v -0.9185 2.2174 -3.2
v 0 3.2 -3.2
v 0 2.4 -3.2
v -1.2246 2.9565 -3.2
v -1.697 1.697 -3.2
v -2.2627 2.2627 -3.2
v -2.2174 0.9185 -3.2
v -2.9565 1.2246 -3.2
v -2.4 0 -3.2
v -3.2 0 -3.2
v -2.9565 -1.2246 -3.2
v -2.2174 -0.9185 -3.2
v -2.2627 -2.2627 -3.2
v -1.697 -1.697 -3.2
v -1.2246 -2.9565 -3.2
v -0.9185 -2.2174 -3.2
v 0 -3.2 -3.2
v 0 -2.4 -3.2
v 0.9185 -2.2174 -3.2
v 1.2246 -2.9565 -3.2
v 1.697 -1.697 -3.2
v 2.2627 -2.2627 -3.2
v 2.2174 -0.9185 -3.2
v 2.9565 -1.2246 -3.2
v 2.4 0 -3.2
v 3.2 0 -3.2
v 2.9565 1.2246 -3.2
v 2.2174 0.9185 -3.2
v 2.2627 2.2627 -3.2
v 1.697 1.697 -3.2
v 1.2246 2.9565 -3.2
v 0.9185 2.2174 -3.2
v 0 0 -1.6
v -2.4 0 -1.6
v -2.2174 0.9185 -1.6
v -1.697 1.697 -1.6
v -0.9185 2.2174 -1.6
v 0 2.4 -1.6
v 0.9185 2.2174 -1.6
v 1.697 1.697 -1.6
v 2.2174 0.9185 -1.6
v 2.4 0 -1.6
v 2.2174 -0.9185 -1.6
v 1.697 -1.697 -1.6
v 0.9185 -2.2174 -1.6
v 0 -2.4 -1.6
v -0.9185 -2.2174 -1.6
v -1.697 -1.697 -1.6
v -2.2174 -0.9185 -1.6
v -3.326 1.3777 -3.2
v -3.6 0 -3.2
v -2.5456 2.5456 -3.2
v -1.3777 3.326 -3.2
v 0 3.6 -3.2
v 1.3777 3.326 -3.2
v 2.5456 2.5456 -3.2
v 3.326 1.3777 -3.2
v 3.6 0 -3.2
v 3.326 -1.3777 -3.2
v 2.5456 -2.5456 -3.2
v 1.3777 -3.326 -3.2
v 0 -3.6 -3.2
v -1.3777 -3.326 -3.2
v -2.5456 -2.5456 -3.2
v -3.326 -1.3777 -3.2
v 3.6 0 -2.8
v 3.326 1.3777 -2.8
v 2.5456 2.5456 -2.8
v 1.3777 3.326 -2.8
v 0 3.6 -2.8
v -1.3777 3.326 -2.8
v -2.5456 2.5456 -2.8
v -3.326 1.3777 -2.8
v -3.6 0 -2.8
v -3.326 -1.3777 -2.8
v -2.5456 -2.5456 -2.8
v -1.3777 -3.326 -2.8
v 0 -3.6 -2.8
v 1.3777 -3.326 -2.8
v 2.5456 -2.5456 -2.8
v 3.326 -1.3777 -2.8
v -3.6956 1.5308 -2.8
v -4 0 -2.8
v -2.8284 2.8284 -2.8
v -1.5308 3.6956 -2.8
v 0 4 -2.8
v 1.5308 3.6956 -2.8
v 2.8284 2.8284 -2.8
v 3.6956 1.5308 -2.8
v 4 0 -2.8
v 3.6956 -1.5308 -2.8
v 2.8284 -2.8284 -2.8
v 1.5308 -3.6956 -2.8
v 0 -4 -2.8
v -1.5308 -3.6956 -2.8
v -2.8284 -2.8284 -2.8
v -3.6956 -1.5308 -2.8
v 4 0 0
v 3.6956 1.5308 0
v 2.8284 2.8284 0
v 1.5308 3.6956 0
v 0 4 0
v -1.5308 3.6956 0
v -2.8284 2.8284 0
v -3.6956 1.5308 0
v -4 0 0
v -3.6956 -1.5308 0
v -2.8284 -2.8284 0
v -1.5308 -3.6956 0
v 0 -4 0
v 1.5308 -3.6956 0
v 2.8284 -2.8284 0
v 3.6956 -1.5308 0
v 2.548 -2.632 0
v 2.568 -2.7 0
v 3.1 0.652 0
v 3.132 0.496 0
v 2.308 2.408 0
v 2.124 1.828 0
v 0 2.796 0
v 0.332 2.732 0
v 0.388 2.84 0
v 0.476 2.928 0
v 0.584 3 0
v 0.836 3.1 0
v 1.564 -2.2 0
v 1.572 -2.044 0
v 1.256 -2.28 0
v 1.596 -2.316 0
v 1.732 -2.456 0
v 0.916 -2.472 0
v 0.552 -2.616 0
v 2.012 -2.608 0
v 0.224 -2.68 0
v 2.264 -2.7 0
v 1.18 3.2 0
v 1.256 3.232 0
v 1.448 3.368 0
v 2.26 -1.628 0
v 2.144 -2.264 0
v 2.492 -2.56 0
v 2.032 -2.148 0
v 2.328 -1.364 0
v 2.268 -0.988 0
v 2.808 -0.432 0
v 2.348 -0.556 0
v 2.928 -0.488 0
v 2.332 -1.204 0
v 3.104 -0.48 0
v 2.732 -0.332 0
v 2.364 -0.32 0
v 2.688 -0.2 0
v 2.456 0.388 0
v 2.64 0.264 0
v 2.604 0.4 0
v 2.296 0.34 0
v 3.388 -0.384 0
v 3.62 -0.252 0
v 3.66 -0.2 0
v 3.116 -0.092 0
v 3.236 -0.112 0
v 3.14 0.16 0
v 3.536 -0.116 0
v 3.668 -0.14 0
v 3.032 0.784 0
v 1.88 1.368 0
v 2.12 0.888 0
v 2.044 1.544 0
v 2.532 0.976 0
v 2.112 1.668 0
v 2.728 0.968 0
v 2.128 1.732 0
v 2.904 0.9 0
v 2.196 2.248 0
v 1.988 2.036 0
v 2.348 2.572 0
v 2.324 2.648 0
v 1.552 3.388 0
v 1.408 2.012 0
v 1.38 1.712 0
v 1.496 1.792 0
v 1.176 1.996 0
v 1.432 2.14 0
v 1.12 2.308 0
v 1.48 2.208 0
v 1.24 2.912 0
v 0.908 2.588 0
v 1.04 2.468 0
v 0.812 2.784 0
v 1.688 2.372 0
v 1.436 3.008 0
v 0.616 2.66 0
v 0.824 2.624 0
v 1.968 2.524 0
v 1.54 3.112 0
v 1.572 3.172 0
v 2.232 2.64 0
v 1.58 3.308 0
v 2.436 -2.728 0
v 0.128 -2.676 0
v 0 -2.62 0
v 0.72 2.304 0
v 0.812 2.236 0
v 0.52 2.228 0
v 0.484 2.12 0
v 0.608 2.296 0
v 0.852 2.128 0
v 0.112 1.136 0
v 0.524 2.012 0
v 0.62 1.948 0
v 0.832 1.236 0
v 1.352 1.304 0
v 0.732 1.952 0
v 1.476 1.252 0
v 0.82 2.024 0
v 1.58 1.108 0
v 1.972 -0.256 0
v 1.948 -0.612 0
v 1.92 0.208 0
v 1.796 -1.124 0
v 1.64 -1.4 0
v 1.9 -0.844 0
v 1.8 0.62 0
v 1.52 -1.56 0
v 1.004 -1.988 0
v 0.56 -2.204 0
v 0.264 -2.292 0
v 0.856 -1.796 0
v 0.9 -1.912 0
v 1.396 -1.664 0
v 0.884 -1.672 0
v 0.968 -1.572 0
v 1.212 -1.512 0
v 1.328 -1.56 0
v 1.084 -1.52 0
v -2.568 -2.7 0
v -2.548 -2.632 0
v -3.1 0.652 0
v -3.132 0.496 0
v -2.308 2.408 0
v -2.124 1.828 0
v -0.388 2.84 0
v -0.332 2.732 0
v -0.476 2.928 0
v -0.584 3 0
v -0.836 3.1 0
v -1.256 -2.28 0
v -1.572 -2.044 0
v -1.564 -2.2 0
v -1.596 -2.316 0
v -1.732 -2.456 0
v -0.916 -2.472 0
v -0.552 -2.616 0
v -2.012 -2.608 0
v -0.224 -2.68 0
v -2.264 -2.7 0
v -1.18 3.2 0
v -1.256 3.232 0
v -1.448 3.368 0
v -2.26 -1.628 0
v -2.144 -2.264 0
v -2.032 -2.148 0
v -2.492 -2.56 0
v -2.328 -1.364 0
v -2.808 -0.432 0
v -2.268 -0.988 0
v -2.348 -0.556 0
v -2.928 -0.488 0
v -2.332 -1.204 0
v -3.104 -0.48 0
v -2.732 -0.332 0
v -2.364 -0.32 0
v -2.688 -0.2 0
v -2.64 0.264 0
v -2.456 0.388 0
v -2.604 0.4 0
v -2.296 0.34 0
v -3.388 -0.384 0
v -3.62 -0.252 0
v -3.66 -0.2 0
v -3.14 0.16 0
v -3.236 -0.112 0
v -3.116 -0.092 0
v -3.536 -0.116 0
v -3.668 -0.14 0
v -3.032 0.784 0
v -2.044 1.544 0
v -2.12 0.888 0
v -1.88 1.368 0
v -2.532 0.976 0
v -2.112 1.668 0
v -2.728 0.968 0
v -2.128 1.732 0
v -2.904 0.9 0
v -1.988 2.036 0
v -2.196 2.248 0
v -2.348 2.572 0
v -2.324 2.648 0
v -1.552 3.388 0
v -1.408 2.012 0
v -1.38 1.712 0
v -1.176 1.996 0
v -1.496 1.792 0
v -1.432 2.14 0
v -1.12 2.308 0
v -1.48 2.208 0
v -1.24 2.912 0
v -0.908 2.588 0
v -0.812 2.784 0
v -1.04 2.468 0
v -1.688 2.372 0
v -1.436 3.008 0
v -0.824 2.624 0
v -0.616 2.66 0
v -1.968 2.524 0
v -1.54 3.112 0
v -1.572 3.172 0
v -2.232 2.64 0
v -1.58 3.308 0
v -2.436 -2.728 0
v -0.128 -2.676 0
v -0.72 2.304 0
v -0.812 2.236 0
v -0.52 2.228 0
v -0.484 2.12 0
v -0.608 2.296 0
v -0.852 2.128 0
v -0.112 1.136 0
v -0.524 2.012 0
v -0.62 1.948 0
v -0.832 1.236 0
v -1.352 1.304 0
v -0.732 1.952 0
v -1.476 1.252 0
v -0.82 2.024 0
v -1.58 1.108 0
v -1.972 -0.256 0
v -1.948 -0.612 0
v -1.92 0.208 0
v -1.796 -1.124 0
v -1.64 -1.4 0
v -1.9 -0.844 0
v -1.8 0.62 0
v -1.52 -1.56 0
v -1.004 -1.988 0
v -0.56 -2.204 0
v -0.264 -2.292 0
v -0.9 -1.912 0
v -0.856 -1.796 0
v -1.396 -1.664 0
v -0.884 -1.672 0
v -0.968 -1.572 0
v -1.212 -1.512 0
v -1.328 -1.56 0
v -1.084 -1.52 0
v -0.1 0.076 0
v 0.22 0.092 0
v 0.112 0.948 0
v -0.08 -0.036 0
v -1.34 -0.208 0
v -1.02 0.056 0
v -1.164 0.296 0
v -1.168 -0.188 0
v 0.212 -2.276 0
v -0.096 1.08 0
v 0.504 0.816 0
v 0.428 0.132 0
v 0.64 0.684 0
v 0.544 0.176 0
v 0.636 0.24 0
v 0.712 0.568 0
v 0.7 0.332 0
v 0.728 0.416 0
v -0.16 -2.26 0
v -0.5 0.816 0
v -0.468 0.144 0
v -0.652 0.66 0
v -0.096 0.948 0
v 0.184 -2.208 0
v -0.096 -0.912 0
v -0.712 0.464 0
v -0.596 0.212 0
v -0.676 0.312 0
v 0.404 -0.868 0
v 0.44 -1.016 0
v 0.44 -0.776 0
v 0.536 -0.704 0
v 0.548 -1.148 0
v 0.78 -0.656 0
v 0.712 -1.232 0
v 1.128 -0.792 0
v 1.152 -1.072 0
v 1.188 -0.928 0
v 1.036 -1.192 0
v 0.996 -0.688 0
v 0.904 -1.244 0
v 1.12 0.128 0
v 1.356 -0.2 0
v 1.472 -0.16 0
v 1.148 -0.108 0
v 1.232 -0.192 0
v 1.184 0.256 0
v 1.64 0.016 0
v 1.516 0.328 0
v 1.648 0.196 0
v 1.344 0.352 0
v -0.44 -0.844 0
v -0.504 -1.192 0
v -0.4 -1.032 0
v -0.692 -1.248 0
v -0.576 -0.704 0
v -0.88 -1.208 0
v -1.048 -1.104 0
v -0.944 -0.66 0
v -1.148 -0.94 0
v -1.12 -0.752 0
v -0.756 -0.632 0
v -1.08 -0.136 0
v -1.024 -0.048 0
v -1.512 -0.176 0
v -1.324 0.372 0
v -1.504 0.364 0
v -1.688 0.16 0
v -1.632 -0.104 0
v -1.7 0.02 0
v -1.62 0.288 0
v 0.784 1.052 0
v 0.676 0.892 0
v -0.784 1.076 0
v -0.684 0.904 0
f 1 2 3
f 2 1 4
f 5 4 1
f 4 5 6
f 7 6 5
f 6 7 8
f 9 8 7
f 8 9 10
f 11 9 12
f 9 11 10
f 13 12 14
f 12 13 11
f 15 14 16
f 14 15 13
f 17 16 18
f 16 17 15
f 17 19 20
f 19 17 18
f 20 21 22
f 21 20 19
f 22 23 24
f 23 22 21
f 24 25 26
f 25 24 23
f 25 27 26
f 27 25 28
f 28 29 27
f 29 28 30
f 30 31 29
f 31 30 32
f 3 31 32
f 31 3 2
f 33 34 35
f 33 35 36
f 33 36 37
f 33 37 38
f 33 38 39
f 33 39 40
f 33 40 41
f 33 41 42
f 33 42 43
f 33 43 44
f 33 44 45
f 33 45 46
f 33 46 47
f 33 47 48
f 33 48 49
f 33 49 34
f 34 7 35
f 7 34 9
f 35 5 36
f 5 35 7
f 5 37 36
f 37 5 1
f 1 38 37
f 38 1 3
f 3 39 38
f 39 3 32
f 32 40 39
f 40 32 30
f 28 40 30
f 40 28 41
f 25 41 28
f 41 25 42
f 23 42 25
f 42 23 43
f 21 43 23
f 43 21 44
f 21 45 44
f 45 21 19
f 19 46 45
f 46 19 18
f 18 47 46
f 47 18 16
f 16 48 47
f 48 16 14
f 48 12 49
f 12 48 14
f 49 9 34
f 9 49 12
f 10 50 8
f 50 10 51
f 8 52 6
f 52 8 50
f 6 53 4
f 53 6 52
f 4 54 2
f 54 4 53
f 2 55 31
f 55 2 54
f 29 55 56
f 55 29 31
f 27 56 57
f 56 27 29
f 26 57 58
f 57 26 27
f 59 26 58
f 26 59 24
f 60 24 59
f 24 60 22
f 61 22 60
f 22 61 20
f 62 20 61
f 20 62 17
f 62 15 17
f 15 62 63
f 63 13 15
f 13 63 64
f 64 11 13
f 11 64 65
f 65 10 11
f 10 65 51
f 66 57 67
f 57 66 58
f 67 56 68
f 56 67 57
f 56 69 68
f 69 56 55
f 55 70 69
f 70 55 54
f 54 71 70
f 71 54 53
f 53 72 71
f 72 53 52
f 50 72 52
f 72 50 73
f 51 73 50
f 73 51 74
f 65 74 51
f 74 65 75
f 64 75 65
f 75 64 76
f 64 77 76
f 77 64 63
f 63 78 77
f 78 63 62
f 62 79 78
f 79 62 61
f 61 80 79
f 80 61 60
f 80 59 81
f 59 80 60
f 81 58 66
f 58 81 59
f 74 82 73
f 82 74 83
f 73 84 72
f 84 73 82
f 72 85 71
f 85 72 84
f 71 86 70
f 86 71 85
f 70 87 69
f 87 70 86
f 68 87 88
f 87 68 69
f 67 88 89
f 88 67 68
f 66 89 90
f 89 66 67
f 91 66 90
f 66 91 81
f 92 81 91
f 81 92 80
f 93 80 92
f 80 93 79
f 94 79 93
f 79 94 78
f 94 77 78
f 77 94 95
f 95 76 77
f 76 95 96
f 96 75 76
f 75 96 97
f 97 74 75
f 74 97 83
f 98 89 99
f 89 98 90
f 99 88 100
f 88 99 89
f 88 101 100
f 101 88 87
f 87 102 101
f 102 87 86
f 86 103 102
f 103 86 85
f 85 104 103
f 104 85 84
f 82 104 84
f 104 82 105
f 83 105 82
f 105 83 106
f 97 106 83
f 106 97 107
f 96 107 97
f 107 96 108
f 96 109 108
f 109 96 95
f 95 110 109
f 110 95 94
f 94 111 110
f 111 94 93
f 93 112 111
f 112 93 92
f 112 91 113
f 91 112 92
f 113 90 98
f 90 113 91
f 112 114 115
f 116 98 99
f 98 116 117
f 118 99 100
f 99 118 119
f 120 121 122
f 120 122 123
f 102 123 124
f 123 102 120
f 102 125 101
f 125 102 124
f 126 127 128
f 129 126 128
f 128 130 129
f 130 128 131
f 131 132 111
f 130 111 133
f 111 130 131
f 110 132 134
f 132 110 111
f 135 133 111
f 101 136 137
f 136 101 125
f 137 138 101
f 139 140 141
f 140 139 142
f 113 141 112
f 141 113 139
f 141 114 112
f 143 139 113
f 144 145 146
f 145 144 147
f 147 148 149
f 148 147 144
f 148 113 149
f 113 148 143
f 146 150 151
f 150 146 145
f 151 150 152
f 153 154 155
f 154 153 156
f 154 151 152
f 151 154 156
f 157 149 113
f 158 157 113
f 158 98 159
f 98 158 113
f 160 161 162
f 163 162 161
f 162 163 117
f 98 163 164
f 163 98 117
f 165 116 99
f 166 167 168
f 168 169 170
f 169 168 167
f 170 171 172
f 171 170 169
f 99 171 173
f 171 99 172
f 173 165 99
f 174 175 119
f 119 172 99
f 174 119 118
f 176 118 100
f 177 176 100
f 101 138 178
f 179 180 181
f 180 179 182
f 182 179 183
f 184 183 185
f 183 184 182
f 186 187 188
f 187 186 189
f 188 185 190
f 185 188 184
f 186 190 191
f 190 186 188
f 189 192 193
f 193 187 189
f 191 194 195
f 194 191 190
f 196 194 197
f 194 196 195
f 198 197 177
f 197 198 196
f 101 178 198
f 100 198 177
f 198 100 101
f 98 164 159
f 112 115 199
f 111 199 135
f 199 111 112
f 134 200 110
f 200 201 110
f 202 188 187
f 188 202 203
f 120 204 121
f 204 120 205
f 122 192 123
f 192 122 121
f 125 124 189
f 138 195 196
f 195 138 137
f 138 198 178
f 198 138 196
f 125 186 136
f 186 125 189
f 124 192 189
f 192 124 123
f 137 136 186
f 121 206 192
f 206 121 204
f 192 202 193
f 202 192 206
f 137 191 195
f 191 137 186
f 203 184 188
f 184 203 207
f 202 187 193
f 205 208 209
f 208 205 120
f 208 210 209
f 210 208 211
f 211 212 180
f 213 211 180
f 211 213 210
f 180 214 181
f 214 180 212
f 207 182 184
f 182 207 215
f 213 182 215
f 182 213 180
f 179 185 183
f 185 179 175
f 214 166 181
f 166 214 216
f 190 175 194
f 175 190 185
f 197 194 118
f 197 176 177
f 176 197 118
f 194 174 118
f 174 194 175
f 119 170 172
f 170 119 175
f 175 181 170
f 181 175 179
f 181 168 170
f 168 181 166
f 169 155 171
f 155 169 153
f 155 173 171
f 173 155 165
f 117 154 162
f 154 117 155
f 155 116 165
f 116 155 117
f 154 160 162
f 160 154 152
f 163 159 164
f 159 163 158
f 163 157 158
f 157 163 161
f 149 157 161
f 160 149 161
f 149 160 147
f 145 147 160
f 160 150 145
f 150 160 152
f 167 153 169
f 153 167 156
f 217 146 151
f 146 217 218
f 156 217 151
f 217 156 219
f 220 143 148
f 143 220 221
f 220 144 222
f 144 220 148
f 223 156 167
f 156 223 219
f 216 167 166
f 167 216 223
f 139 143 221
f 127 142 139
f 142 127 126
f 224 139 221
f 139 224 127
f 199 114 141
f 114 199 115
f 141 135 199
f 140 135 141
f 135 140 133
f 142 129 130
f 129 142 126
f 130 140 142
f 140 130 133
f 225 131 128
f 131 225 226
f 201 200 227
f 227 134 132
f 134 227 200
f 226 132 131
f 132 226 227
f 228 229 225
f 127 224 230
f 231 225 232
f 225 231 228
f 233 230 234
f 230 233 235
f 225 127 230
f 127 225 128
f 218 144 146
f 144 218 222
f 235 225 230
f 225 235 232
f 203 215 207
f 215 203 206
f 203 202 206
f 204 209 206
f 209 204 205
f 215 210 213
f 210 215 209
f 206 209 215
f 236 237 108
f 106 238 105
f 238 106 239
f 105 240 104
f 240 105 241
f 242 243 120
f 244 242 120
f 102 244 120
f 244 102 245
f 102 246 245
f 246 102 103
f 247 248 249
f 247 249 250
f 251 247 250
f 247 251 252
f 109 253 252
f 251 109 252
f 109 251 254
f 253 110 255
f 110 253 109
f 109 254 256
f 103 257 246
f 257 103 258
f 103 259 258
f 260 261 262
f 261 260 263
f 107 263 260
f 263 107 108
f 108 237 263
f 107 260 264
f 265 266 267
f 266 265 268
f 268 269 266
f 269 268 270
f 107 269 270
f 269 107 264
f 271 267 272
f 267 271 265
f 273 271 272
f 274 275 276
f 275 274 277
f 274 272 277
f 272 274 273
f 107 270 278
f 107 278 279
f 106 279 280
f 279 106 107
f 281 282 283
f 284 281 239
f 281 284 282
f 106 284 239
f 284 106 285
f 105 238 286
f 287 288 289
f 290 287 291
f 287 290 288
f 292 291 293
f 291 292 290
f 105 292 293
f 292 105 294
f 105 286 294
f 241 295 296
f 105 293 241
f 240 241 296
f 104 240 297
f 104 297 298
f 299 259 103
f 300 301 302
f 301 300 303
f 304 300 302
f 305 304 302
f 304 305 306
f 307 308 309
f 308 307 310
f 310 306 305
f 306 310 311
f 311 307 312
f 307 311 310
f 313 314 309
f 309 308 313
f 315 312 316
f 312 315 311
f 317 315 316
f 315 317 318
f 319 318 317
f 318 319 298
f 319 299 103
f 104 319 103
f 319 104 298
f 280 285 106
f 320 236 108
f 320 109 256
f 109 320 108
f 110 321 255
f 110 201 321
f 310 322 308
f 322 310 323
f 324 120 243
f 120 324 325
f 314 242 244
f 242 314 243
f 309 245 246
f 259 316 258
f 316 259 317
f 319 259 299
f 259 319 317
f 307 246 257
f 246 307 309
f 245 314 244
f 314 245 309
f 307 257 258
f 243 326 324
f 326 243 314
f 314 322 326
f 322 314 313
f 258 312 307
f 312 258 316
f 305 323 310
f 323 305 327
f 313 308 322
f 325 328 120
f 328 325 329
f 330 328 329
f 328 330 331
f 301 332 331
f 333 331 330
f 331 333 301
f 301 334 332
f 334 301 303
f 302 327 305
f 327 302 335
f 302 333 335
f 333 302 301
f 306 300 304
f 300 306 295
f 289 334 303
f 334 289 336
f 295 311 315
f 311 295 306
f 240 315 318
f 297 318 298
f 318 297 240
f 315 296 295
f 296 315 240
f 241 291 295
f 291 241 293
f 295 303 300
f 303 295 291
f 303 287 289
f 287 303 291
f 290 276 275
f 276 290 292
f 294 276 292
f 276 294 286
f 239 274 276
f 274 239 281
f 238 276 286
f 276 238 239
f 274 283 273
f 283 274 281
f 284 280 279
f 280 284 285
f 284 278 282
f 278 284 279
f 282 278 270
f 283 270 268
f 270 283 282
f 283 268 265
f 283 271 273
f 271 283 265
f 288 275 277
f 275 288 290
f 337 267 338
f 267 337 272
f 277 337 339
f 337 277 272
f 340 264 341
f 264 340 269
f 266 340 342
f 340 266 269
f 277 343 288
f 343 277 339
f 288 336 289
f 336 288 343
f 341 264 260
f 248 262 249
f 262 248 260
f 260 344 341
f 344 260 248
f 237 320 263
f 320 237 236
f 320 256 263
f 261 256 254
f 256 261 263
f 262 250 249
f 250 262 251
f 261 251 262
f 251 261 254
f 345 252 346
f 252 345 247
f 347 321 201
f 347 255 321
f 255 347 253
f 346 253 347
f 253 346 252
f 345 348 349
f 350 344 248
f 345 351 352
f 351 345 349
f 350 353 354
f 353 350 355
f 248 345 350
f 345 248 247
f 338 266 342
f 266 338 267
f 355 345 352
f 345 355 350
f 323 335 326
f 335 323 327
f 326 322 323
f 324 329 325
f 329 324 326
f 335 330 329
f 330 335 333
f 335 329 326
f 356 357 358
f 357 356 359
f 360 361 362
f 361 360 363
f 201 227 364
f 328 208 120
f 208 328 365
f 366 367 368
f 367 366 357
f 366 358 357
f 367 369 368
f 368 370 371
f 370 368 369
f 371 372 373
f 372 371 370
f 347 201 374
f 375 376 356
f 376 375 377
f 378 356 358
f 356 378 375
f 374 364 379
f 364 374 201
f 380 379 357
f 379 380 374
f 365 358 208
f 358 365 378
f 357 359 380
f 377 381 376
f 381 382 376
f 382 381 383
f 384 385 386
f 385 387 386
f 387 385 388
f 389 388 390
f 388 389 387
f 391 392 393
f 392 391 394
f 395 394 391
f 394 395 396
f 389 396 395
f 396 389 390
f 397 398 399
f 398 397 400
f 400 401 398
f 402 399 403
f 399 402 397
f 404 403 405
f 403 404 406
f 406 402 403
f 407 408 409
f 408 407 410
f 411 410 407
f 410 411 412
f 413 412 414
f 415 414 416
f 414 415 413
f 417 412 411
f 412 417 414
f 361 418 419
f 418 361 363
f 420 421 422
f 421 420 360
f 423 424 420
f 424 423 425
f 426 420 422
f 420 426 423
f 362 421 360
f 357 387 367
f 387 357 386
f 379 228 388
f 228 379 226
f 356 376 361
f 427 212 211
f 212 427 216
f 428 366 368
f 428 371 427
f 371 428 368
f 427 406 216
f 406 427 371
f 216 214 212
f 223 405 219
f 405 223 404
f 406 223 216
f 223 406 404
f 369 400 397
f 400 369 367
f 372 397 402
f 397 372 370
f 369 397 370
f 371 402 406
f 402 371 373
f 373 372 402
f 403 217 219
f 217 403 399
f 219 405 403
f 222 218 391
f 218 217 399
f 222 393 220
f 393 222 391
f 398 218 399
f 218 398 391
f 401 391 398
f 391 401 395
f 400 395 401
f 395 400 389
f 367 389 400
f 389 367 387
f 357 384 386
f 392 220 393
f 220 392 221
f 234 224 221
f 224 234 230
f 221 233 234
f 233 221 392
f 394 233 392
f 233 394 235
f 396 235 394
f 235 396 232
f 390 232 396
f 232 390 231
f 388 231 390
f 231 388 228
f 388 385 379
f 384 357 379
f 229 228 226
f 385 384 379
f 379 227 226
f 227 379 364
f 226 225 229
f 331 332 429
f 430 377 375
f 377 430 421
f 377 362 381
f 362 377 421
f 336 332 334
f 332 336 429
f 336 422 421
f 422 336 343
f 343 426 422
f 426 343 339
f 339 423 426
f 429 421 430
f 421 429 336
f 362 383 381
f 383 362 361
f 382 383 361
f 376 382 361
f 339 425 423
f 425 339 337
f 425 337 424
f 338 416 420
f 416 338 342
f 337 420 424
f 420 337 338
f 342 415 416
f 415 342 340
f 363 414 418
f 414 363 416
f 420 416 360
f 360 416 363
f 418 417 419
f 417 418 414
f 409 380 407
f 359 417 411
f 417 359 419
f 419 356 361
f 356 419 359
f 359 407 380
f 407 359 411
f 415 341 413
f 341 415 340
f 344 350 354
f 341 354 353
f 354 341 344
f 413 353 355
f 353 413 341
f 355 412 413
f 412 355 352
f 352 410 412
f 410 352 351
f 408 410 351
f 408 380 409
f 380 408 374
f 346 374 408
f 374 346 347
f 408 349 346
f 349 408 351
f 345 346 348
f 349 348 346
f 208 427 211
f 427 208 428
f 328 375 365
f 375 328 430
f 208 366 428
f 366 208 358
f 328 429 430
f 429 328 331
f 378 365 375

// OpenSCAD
use <../lib.scad>
use <../p/4-4ering.scad>
use <s/98138p3ds01.scad>
use <s/98138s02.scad>
function ldraw_lib__98138p3d() = [
// 0 Tile  1 x  1 Round with Red Ladybug Pattern
// 0 Name: 98138p3d.dat
// 0 Author: Philippe Hurbain [Philo]
// 0 !LDRAW_ORG Part UPDATE 2026-04
// 0 !LICENSE Licensed under CC BY 4.0 : see CAreadme.txt
// 
// 0 BFC CERTIFY CCW
  [0,"BFC","CERTIFY"],
  [0,"BFC","CCW"],
// 
// 0 !KEYWORDS Bricklink 98138pb447, Brickowl 405170, Brickset 107749, Insect
// 0 !KEYWORDS Rebrickable 98138pr0429, Set 42651, Set 42652, Set 42669, Set 42670
// 
// 0 !HISTORY 2025-02-27 [OrionP] Official Update 2025-02
// 0 !HISTORY 2026-01-16 [Blechtaler] added NOCLIP
// 0 !HISTORY 2026-04-27 [OrionP] Official Update 2026-04
// 
// 1 16 0 0 0 1 0 0 0 1 0 0 0 1 s\98138s02.dat
  [1,16,0,0,0,1,0,0,0,1,0,0,0,1, ldraw_lib__s__98138s02()],
// 1 16 0 0 0 10 0 0 0 1 0 0 0 10 4-4ering.dat
  [1,16,0,0,0,10,0,0,0,1,0,0,0,10, ldraw_lib__4_4ering()],
// 
// 1 16 0 0 0 1 0 0 0 1 0 0 0 1 s\98138p3ds01.dat
  [1,16,0,0,0,1,0,0,0,1,0,0,0,1, ldraw_lib__s__98138p3ds01()],
// 1 16 0 0 0 -1 0 0 0 1 0 0 0 1 s\98138p3ds01.dat
  [1,16,0,0,0,-1,0,0,0,1,0,0,0,1, ldraw_lib__s__98138p3ds01()],
// 
// 0 BFC NOCLIP
  [0,"BFC","NOCLIP"],
// 4 0 -.2 0 -.09 .55 0 .23 .28 0 2.37 -.25 0 .19
  [4,0,-.2,0,-.09,.55,0,.23,.28,0,2.37,-.25,0,.19],
// 4 0 -2.92 0 -.47 -2.55 0 .14 -2.91 0 .74 -3.35 0 -.52
  [4,0,-2.92,0,-.47,-2.55,0,.14,-2.91,0,.74,-3.35,0,-.52],
// 3 0 0 0 -6.55 .66 0 -5.73 .53 0 -5.69
  [3,0,0,0,-6.55,.66,0,-5.73,.53,0,-5.69],
// 4 0 -.24 0 2.7 .28 0 2.84 0 0 6.99 -.28 0 2.84
  [4,0,-.24,0,2.7,.28,0,2.84,0,0,6.99,-.28,0,2.84],
// 4 0 .55 0 .23 1.07 0 .33 1.6 0 1.71 1.26 0 2.04
  [4,0,.55,0,.23,1.07,0,.33,1.6,0,1.71,1.26,0,2.04],
// 3 0 1.26 0 2.04 .28 0 2.37 .55 0 .23
  [3,0,1.26,0,2.04,.28,0,2.37,.55,0,.23],
// 3 0 1.07 0 .33 1.36 0 .44 1.6 0 1.71
  [3,0,1.07,0,.33,1.36,0,.44,1.6,0,1.71],
// 4 0 1.78 0 1.42 1.6 0 1.71 1.36 0 .44 1.59 0 .6
  [4,0,1.78,0,1.42,1.6,0,1.71,1.36,0,.44,1.59,0,.6],
// 4 0 1.82 0 1.04 1.78 0 1.42 1.59 0 .6 1.75 0 .83
  [4,0,1.82,0,1.04,1.78,0,1.42,1.59,0,.6,1.75,0,.83],
// 3 0 -.66 0 -5.73 0 0 -6.55 -.4 0 -5.65
  [3,0,-.66,0,-5.73,0,0,-6.55,-.4,0,-5.65],
// 4 0 -.25 0 .19 -1.25 0 2.04 -1.63 0 1.65 -1.17 0 .36
  [4,0,-.25,0,.19,-1.25,0,2.04,-1.63,0,1.65,-1.17,0,.36],
// 4 0 -1.25 0 2.04 -.25 0 .19 .28 0 2.37 -.24 0 2.37
  [4,0,-1.25,0,2.04,-.25,0,.19,.28,0,2.37,-.24,0,2.37],
// 4 0 .46 0 -5.52 -.4 0 -5.65 0 0 -6.55 .53 0 -5.69
  [4,0,.46,0,-5.52,-.4,0,-5.65,0,0,-6.55,.53,0,-5.69],
// 4 0 .55 0 .23 -.24 0 -2.28 -.4 0 -5.65 .46 0 -5.52
  [4,0,.55,0,.23,-.24,0,-2.28,-.4,0,-5.65,.46,0,-5.52],
// 4 0 .28 0 2.37 .28 0 2.84 -.24 0 2.7 -.24 0 2.37
  [4,0,.28,0,2.37,.28,0,2.84,-.24,0,2.7,-.24,0,2.37],
// 3 0 .55 0 .23 -.2 0 -.09 -.24 0 -2.28
  [3,0,.55,0,.23,-.2,0,-.09,-.24,0,-2.28],
// 3 0 -1.63 0 1.65 -1.78 0 1.16 -1.17 0 .36
  [3,0,-1.63,0,1.65,-1.78,0,1.16,-1.17,0,.36],
// 4 0 -1.17 0 .36 -1.78 0 1.16 -1.69 0 .78 -1.49 0 .53
  [4,0,-1.17,0,.36,-1.78,0,1.16,-1.69,0,.78,-1.49,0,.53],
// 3 0 1.01 0 -2.17 1.1 0 -2.54 1.1 0 -1.94
  [3,0,1.01,0,-2.17,1.1,0,-2.54,1.1,0,-1.94],
// 4 0 1.37 0 -2.87 1.34 0 -1.76 1.1 0 -1.94 1.1 0 -2.54
  [4,0,1.37,0,-2.87,1.34,0,-1.76,1.1,0,-1.94,1.1,0,-2.54],
// 4 0 1.34 0 -1.76 1.37 0 -2.87 1.78 0 -3.08 1.95 0 -1.64
  [4,0,1.34,0,-1.76,1.37,0,-2.87,1.78,0,-3.08,1.95,0,-1.64],
// 4 0 2.97 0 -2.32 2.82 0 -1.98 2.59 0 -2.98 2.88 0 -2.68
  [4,0,2.97,0,-2.32,2.82,0,-1.98,2.59,0,-2.98,2.88,0,-2.68],
// 4 0 2.26 0 -3.11 2.59 0 -2.98 2.82 0 -1.98 2.49 0 -1.72
  [4,0,2.26,0,-3.11,2.59,0,-2.98,2.82,0,-1.98,2.49,0,-1.72],
// 4 0 1.78 0 -3.08 2.26 0 -3.11 2.49 0 -1.72 1.95 0 -1.64
  [4,0,1.78,0,-3.08,2.26,0,-3.11,2.49,0,-1.72,1.95,0,-1.64],
// 4 0 3.68 0 -.4 2.8 0 .32 2.87 0 -.27 3.39 0 -.5
  [4,0,3.68,0,-.4,2.8,0,.32,2.87,0,-.27,3.39,0,-.5],
// 3 0 2.87 0 -.27 3.08 0 -.48 3.39 0 -.5
  [3,0,2.87,0,-.27,3.08,0,-.48,3.39,0,-.5],
// 4 0 2.8 0 .32 3.68 0 -.4 4.1 0 .04 2.96 0 .64
  [4,0,2.8,0,.32,3.68,0,-.4,4.1,0,.04,2.96,0,.64],
// 4 0 4.12 0 .49 3.79 0 .82 3.36 0 .88 4.1 0 .04
  [4,0,4.12,0,.49,3.79,0,.82,3.36,0,.88,4.1,0,.04],
// 3 0 3.36 0 .88 2.96 0 .64 4.1 0 .04
  [3,0,3.36,0,.88,2.96,0,.64,4.1,0,.04],
// 4 0 -1 0 -2.58 -1.1 0 -2.11 -1.73 0 -3.12 -1.26 0 -2.98
  [4,0,-1,0,-2.58,-1.1,0,-2.11,-1.73,0,-3.12,-1.26,0,-2.98],
// 4 0 -1.1 0 -2.11 -1.44 0 -1.76 -2.2 0 -3.02 -1.73 0 -3.12
  [4,0,-1.1,0,-2.11,-1.44,0,-1.76,-2.2,0,-3.02,-1.73,0,-3.12],
// 3 0 -2.62 0 -2.76 -2.2 0 -3.02 -2.36 0 -1.65
  [3,0,-2.62,0,-2.76,-2.2,0,-3.02,-2.36,0,-1.65],
// 4 0 -2.62 0 -2.76 -2.36 0 -1.65 -2.8 0 -1.88 -2.87 0 -2.35
  [4,0,-2.62,0,-2.76,-2.36,0,-1.65,-2.8,0,-1.88,-2.87,0,-2.35],
// 4 0 -2.36 0 -1.65 -2.2 0 -3.02 -1.44 0 -1.76 -1.89 0 -1.58
  [4,0,-2.36,0,-1.65,-2.2,0,-3.02,-1.44,0,-1.76,-1.89,0,-1.58],
// 4 0 -2.56 0 -.12 -2.55 0 .14 -2.92 0 -.47 -2.7 0 -.34
  [4,0,-2.56,0,-.12,-2.55,0,.14,-2.92,0,-.47,-2.7,0,-.34],
// 4 0 -3.76 0 .91 -3.78 0 -.44 -3.35 0 -.52 -3.31 0 .93
  [4,0,-3.76,0,.91,-3.78,0,-.44,-3.35,0,-.52,-3.31,0,.93],
// 4 0 -4.25 0 .05 -4.08 0 -.26 -3.78 0 -.44 -4.22 0 .4
  [4,0,-4.25,0,.05,-4.08,0,-.26,-3.78,0,-.44,-4.22,0,.4],
// 4 0 -4.05 0 .72 -4.22 0 .4 -3.78 0 -.44 -3.76 0 .91
  [4,0,-4.05,0,.72,-4.22,0,.4,-3.78,0,-.44,-3.76,0,.91],
// 3 0 -2.91 0 .74 -3.31 0 .93 -3.35 0 -.52
  [3,0,-2.91,0,.74,-3.31,0,.93,-3.35,0,-.52],
// 4 4 1.1 0 -1.94 1.34 0 -1.76 1.07 0 .33 .55 0 .23
  [4,4,1.1,0,-1.94,1.34,0,-1.76,1.07,0,.33,.55,0,.23],
// 4 4 1.37 0 -2.87 .46 0 -5.52 1.4 0 -5.51 2.14 0 -4.49
  [4,4,1.37,0,-2.87,.46,0,-5.52,1.4,0,-5.51,2.14,0,-4.49],
// 3 4 -.25 0 .19 -1.17 0 .36 -2.55 0 .14
  [3,4,-.25,0,.19,-1.17,0,.36,-2.55,0,.14],
// 4 4 3.95 0 2.77 3.38 0 3.26 2.08 0 3.09 1.96 0 2.63
  [4,4,3.95,0,2.77,3.38,0,3.26,2.08,0,3.09,1.96,0,2.63],
// 3 4 1.69 0 2.23 1.26 0 2.04 1.6 0 1.71
  [3,4,1.69,0,2.23,1.26,0,2.04,1.6,0,1.71],
// 4 4 1.6 0 1.71 1.78 0 1.42 1.96 0 2.63 1.69 0 2.23
  [4,4,1.6,0,1.71,1.78,0,1.42,1.96,0,2.63,1.69,0,2.23],
// 4 4 1.78 0 1.42 3.36 0 .88 3.95 0 2.77 1.96 0 2.63
  [4,4,1.78,0,1.42,3.36,0,.88,3.95,0,2.77,1.96,0,2.63],
// 3 4 3.95 0 2.77 3.69 0 3.13 3.38 0 3.26
  [3,4,3.95,0,2.77,3.69,0,3.13,3.38,0,3.26],
// 4 4 3.79 0 .82 4.12 0 .49 4.8 0 .52 4.5 0 1.55
  [4,4,3.79,0,.82,4.12,0,.49,4.8,0,.52,4.5,0,1.55],
// 4 4 3.95 0 2.77 3.36 0 .88 3.79 0 .82 4.5 0 1.55
  [4,4,3.95,0,2.77,3.36,0,.88,3.79,0,.82,4.5,0,1.55],
// 4 4 2.87 0 -.27 2.8 0 .32 1.36 0 .44 1.07 0 .33
  [4,4,2.87,0,-.27,2.8,0,.32,1.36,0,.44,1.07,0,.33],
// 4 4 1.59 0 .6 2.8 0 .32 2.96 0 .64 1.75 0 .83
  [4,4,1.59,0,.6,2.8,0,.32,2.96,0,.64,1.75,0,.83],
// 3 4 1.36 0 .44 2.8 0 .32 1.59 0 .6
  [3,4,1.36,0,.44,2.8,0,.32,1.59,0,.6],
// 4 4 1.82 0 1.04 2.96 0 .64 3.36 0 .88 1.78 0 1.42
  [4,4,1.82,0,1.04,2.96,0,.64,3.36,0,.88,1.78,0,1.42],
// 3 4 1.82 0 1.04 1.75 0 .83 2.96 0 .64
  [3,4,1.82,0,1.04,1.75,0,.83,2.96,0,.64],
// 4 4 3.68 0 -.4 4.93 0 -.64 4.8 0 .52 4.1 0 .04
  [4,4,3.68,0,-.4,4.93,0,-.64,4.8,0,.52,4.1,0,.04],
// 3 4 4.8 0 .52 4.12 0 .49 4.1 0 .04
  [3,4,4.8,0,.52,4.12,0,.49,4.1,0,.04],
// 3 4 4.75 0 -2.11 4.87 0 -1.53 2.82 0 -1.98
  [3,4,4.75,0,-2.11,4.87,0,-1.53,2.82,0,-1.98],
// 3 4 4.87 0 -1.53 4.93 0 -.64 3.68 0 -.4
  [3,4,4.87,0,-1.53,4.93,0,-.64,3.68,0,-.4],
// 4 4 4.49 0 -2.81 4.75 0 -2.11 2.82 0 -1.98 2.97 0 -2.32
  [4,4,4.49,0,-2.81,4.75,0,-2.11,2.82,0,-1.98,2.97,0,-2.32],
// 4 4 2.82 0 -1.98 4.87 0 -1.53 3.68 0 -.4 3.39 0 -.5
  [4,4,2.82,0,-1.98,4.87,0,-1.53,3.68,0,-.4,3.39,0,-.5],
// 4 4 2.49 0 -1.72 2.82 0 -1.98 3.39 0 -.5 3.08 0 -.48
  [4,4,2.49,0,-1.72,2.82,0,-1.98,3.39,0,-.5,3.08,0,-.48],
// 4 4 3.08 0 -.48 2.87 0 -.27 1.95 0 -1.64 2.49 0 -1.72
  [4,4,3.08,0,-.48,2.87,0,-.27,1.95,0,-1.64,2.49,0,-1.72],
// 4 4 2.87 0 -.27 1.07 0 .33 1.34 0 -1.76 1.95 0 -1.64
  [4,4,2.87,0,-.27,1.07,0,.33,1.34,0,-1.76,1.95,0,-1.64],
// 3 4 .55 0 .23 1.01 0 -2.17 1.1 0 -1.94
  [3,4,.55,0,.23,1.01,0,-2.17,1.1,0,-1.94],
// 4 4 2.97 0 -2.32 2.88 0 -2.68 4.1 0 -3.5 4.49 0 -2.81
  [4,4,2.97,0,-2.32,2.88,0,-2.68,4.1,0,-3.5,4.49,0,-2.81],
// 4 4 4.1 0 -3.5 3.32 0 -3.9 3.49 0 -4.16 3.8 0 -3.9
  [4,4,4.1,0,-3.5,3.32,0,-3.9,3.49,0,-4.16,3.8,0,-3.9],
// 4 4 3.32 0 -3.9 4.1 0 -3.5 2.88 0 -2.68 3.03 0 -3.78
  [4,4,3.32,0,-3.9,4.1,0,-3.5,2.88,0,-2.68,3.03,0,-3.78],
// 4 4 2.71 0 -3.8 3.03 0 -3.78 2.88 0 -2.68 2.59 0 -2.98
  [4,4,2.71,0,-3.8,3.03,0,-3.78,2.88,0,-2.68,2.59,0,-2.98],
// 4 4 2.59 0 -2.98 2.26 0 -3.11 2.42 0 -3.93 2.71 0 -3.8
  [4,4,2.59,0,-2.98,2.26,0,-3.11,2.42,0,-3.93,2.71,0,-3.8],
// 4 4 2.26 0 -3.11 1.78 0 -3.08 2.21 0 -4.18 2.42 0 -3.93
  [4,4,2.26,0,-3.11,1.78,0,-3.08,2.21,0,-4.18,2.42,0,-3.93],
// 4 4 2.14 0 -4.49 2.21 0 -4.18 1.78 0 -3.08 1.37 0 -2.87
  [4,4,2.14,0,-4.49,2.21,0,-4.18,1.78,0,-3.08,1.37,0,-2.87],
// 3 4 1.37 0 -2.87 1.1 0 -2.54 .46 0 -5.52
  [3,4,1.37,0,-2.87,1.1,0,-2.54,.46,0,-5.52],
// 3 4 1.01 0 -2.17 .55 0 .23 .46 0 -5.52
  [3,4,1.01,0,-2.17,.55,0,.23,.46,0,-5.52],
// 3 4 2.25 0 -4.78 2.14 0 -4.49 1.4 0 -5.51
  [3,4,2.25,0,-4.78,2.14,0,-4.49,1.4,0,-5.51],
// 3 4 1.1 0 -2.54 1.01 0 -2.17 .46 0 -5.52
  [3,4,1.1,0,-2.54,1.01,0,-2.17,.46,0,-5.52],
// 4 4 1.4 0 -5.51 .46 0 -5.52 .53 0 -5.69 .66 0 -5.73
  [4,4,1.4,0,-5.51,.46,0,-5.52,.53,0,-5.69,.66,0,-5.73],
// 3 4 1.4 0 -5.51 2.51 0 -4.97 2.25 0 -4.78
  [3,4,1.4,0,-5.51,2.51,0,-4.97,2.25,0,-4.78],
// 3 4 -2.08 0 3.09 -3.38 0 3.26 -1.96 0 2.69
  [3,4,-2.08,0,3.09,-3.38,0,3.26,-1.96,0,2.69],
// 4 4 -1.25 0 2.04 -1.71 0 2.26 -3.31 0 .93 -1.63 0 1.65
  [4,4,-1.25,0,2.04,-1.71,0,2.26,-3.31,0,.93,-1.63,0,1.65],
// 4 4 -3.31 0 .93 -2.91 0 .74 -1.78 0 1.16 -1.63 0 1.65
  [4,4,-3.31,0,.93,-2.91,0,.74,-1.78,0,1.16,-1.63,0,1.65],
// 4 4 -3.69 0 3.13 -3.95 0 2.77 -1.96 0 2.69 -3.38 0 3.26
  [4,4,-3.69,0,3.13,-3.95,0,2.77,-1.96,0,2.69,-3.38,0,3.26],
// 4 4 -3.31 0 .93 -3.95 0 2.77 -4.5 0 1.55 -3.76 0 .91
  [4,4,-3.31,0,.93,-3.95,0,2.77,-4.5,0,1.55,-3.76,0,.91],
// 4 4 -3.76 0 .91 -4.5 0 1.55 -4.8 0 .52 -4.05 0 .72
  [4,4,-3.76,0,.91,-4.5,0,1.55,-4.8,0,.52,-4.05,0,.72],
// 3 4 -4.8 0 .52 -4.22 0 .4 -4.05 0 .72
  [3,4,-4.8,0,.52,-4.22,0,.4,-4.05,0,.72],
// 4 4 -1.71 0 2.26 -1.96 0 2.69 -3.95 0 2.77 -3.31 0 .93
  [4,4,-1.71,0,2.26,-1.96,0,2.69,-3.95,0,2.77,-3.31,0,.93],
// 4 4 -2.55 0 .14 -1.69 0 .78 -1.78 0 1.16 -2.91 0 .74
  [4,4,-2.55,0,.14,-1.69,0,.78,-1.78,0,1.16,-2.91,0,.74],
// 3 4 -1.49 0 .53 -1.69 0 .78 -2.55 0 .14
  [3,4,-1.49,0,.53,-1.69,0,.78,-2.55,0,.14],
// 3 4 -1.17 0 .36 -1.49 0 .53 -2.55 0 .14
  [3,4,-1.17,0,.36,-1.49,0,.53,-2.55,0,.14],
// 4 4 -4.22 0 .4 -4.8 0 .52 -4.93 0 -.64 -4.25 0 .05
  [4,4,-4.22,0,.4,-4.8,0,.52,-4.93,0,-.64,-4.25,0,.05],
// 3 4 -4.25 0 .05 -4.93 0 -.64 -4.08 0 -.26
  [3,4,-4.25,0,.05,-4.93,0,-.64,-4.08,0,-.26],
// 4 4 -3.78 0 -.44 -4.87 0 -1.53 -4.75 0 -2.11 -2.8 0 -1.88
  [4,4,-3.78,0,-.44,-4.87,0,-1.53,-4.75,0,-2.11,-2.8,0,-1.88],
// 4 4 -4.08 0 -.26 -4.93 0 -.64 -4.87 0 -1.53 -3.78 0 -.44
  [4,4,-4.08,0,-.26,-4.93,0,-.64,-4.87,0,-1.53,-3.78,0,-.44],
// 4 4 -2.8 0 -1.88 -4.75 0 -2.11 -4.49 0 -2.81 -2.87 0 -2.35
  [4,4,-2.8,0,-1.88,-4.75,0,-2.11,-4.49,0,-2.81,-2.87,0,-2.35],
// 4 4 -2.7 0 -.34 -2.92 0 -.47 -2.8 0 -1.88 -2.36 0 -1.65
  [4,4,-2.7,0,-.34,-2.92,0,-.47,-2.8,0,-1.88,-2.36,0,-1.65],
// 3 4 -3.78 0 -.44 -2.8 0 -1.88 -3.35 0 -.52
  [3,4,-3.78,0,-.44,-2.8,0,-1.88,-3.35,0,-.52],
// 3 4 -3.35 0 -.52 -2.8 0 -1.88 -2.92 0 -.47
  [3,4,-3.35,0,-.52,-2.8,0,-1.88,-2.92,0,-.47],
// 4 4 -2.56 0 -.12 -2.7 0 -.34 -2.36 0 -1.65 -1.89 0 -1.58
  [4,4,-2.56,0,-.12,-2.7,0,-.34,-2.36,0,-1.65,-1.89,0,-1.58],
// 3 4 -1 0 -2.58 -.24 0 -2.28 -1.1 0 -2.11
  [3,4,-1,0,-2.58,-.24,0,-2.28,-1.1,0,-2.11],
// 4 4 -1.44 0 -1.76 -.2 0 -.09 -2.56 0 -.12 -1.89 0 -1.58
  [4,4,-1.44,0,-1.76,-.2,0,-.09,-2.56,0,-.12,-1.89,0,-1.58],
// 4 4 -.2 0 -.09 -.25 0 .19 -2.55 0 .14 -2.56 0 -.12
  [4,4,-.2,0,-.09,-.25,0,.19,-2.55,0,.14,-2.56,0,-.12],
// 4 4 -1.44 0 -1.76 -1.1 0 -2.11 -.24 0 -2.28 -.2 0 -.09
  [4,4,-1.44,0,-1.76,-1.1,0,-2.11,-.24,0,-2.28,-.2,0,-.09],
// 4 4 -2.62 0 -2.76 -2.87 0 -2.35 -4.49 0 -2.81 -4.1 0 -3.5
  [4,4,-2.62,0,-2.76,-2.87,0,-2.35,-4.49,0,-2.81,-4.1,0,-3.5],
// 3 4 -3.8 0 -3.9 -3.49 0 -4.16 -3.32 0 -3.9
  [3,4,-3.8,0,-3.9,-3.49,0,-4.16,-3.32,0,-3.9],
// 4 4 -3.03 0 -3.78 -4.1 0 -3.5 -3.8 0 -3.9 -3.32 0 -3.9
  [4,4,-3.03,0,-3.78,-4.1,0,-3.5,-3.8,0,-3.9,-3.32,0,-3.9],
// 4 4 -2.71 0 -3.8 -2.62 0 -2.76 -4.1 0 -3.5 -3.03 0 -3.78
  [4,4,-2.71,0,-3.8,-2.62,0,-2.76,-4.1,0,-3.5,-3.03,0,-3.78],
// 4 4 -2.42 0 -3.93 -2.2 0 -3.02 -2.62 0 -2.76 -2.71 0 -3.8
  [4,4,-2.42,0,-3.93,-2.2,0,-3.02,-2.62,0,-2.76,-2.71,0,-3.8],
// 4 4 -2.2 0 -3.02 -2.42 0 -3.93 -2.21 0 -4.18 -1.73 0 -3.12
  [4,4,-2.2,0,-3.02,-2.42,0,-3.93,-2.21,0,-4.18,-1.73,0,-3.12],
// 3 4 -1.26 0 -2.98 -1.73 0 -3.12 -2.21 0 -4.18
  [3,4,-1.26,0,-2.98,-1.73,0,-3.12,-2.21,0,-4.18],
// 4 4 -1 0 -2.58 -1.26 0 -2.98 -.4 0 -5.65 -.24 0 -2.28
  [4,4,-1,0,-2.58,-1.26,0,-2.98,-.4,0,-5.65,-.24,0,-2.28],
// 4 4 -1.26 0 -2.98 -1.4 0 -5.51 -.66 0 -5.73 -.4 0 -5.65
  [4,4,-1.26,0,-2.98,-1.4,0,-5.51,-.66,0,-5.73,-.4,0,-5.65],
// 4 4 -1.4 0 -5.51 -1.26 0 -2.98 -2.21 0 -4.18 -2.14 0 -4.49
  [4,4,-1.4,0,-5.51,-1.26,0,-2.98,-2.21,0,-4.18,-2.14,0,-4.49],
// 3 4 -2.51 0 -4.97 -1.4 0 -5.51 -2.25 0 -4.78
  [3,4,-2.51,0,-4.97,-1.4,0,-5.51,-2.25,0,-4.78],
// 3 4 -2.14 0 -4.49 -2.25 0 -4.78 -1.4 0 -5.51
  [3,4,-2.14,0,-4.49,-2.25,0,-4.78,-1.4,0,-5.51],
// 4 15 2.08 0 3.09 .28 0 2.84 1.69 0 2.23 1.96 0 2.63
  [4,15,2.08,0,3.09,.28,0,2.84,1.69,0,2.23,1.96,0,2.63],
// 4 15 -.24 0 2.7 -.28 0 2.84 -1.71 0 2.26 -1.25 0 2.04
  [4,15,-.24,0,2.7,-.28,0,2.84,-1.71,0,2.26,-1.25,0,2.04],
// 4 15 .28 0 2.37 1.26 0 2.04 1.69 0 2.23 .28 0 2.84
  [4,15,.28,0,2.37,1.26,0,2.04,1.69,0,2.23,.28,0,2.84],
// 4 15 -1.71 0 2.26 -.28 0 2.84 -2.08 0 3.09 -1.96 0 2.69
  [4,15,-1.71,0,2.26,-.28,0,2.84,-2.08,0,3.09,-1.96,0,2.69],
// 3 15 -.24 0 2.37 -.24 0 2.7 -1.25 0 2.04
  [3,15,-.24,0,2.37,-.24,0,2.7,-1.25,0,2.04],
];
module ldraw_lib__98138p3d(step=0, col=false, unit=2/5, alt=false, line=0.2, solid=!$preview)
    makepoly(ldraw_lib__98138p3d(), step=step, col=col, unit=unit, alt=alt, line=line, solid=solid);
ldraw_lib__98138p3d(line=0.2);
